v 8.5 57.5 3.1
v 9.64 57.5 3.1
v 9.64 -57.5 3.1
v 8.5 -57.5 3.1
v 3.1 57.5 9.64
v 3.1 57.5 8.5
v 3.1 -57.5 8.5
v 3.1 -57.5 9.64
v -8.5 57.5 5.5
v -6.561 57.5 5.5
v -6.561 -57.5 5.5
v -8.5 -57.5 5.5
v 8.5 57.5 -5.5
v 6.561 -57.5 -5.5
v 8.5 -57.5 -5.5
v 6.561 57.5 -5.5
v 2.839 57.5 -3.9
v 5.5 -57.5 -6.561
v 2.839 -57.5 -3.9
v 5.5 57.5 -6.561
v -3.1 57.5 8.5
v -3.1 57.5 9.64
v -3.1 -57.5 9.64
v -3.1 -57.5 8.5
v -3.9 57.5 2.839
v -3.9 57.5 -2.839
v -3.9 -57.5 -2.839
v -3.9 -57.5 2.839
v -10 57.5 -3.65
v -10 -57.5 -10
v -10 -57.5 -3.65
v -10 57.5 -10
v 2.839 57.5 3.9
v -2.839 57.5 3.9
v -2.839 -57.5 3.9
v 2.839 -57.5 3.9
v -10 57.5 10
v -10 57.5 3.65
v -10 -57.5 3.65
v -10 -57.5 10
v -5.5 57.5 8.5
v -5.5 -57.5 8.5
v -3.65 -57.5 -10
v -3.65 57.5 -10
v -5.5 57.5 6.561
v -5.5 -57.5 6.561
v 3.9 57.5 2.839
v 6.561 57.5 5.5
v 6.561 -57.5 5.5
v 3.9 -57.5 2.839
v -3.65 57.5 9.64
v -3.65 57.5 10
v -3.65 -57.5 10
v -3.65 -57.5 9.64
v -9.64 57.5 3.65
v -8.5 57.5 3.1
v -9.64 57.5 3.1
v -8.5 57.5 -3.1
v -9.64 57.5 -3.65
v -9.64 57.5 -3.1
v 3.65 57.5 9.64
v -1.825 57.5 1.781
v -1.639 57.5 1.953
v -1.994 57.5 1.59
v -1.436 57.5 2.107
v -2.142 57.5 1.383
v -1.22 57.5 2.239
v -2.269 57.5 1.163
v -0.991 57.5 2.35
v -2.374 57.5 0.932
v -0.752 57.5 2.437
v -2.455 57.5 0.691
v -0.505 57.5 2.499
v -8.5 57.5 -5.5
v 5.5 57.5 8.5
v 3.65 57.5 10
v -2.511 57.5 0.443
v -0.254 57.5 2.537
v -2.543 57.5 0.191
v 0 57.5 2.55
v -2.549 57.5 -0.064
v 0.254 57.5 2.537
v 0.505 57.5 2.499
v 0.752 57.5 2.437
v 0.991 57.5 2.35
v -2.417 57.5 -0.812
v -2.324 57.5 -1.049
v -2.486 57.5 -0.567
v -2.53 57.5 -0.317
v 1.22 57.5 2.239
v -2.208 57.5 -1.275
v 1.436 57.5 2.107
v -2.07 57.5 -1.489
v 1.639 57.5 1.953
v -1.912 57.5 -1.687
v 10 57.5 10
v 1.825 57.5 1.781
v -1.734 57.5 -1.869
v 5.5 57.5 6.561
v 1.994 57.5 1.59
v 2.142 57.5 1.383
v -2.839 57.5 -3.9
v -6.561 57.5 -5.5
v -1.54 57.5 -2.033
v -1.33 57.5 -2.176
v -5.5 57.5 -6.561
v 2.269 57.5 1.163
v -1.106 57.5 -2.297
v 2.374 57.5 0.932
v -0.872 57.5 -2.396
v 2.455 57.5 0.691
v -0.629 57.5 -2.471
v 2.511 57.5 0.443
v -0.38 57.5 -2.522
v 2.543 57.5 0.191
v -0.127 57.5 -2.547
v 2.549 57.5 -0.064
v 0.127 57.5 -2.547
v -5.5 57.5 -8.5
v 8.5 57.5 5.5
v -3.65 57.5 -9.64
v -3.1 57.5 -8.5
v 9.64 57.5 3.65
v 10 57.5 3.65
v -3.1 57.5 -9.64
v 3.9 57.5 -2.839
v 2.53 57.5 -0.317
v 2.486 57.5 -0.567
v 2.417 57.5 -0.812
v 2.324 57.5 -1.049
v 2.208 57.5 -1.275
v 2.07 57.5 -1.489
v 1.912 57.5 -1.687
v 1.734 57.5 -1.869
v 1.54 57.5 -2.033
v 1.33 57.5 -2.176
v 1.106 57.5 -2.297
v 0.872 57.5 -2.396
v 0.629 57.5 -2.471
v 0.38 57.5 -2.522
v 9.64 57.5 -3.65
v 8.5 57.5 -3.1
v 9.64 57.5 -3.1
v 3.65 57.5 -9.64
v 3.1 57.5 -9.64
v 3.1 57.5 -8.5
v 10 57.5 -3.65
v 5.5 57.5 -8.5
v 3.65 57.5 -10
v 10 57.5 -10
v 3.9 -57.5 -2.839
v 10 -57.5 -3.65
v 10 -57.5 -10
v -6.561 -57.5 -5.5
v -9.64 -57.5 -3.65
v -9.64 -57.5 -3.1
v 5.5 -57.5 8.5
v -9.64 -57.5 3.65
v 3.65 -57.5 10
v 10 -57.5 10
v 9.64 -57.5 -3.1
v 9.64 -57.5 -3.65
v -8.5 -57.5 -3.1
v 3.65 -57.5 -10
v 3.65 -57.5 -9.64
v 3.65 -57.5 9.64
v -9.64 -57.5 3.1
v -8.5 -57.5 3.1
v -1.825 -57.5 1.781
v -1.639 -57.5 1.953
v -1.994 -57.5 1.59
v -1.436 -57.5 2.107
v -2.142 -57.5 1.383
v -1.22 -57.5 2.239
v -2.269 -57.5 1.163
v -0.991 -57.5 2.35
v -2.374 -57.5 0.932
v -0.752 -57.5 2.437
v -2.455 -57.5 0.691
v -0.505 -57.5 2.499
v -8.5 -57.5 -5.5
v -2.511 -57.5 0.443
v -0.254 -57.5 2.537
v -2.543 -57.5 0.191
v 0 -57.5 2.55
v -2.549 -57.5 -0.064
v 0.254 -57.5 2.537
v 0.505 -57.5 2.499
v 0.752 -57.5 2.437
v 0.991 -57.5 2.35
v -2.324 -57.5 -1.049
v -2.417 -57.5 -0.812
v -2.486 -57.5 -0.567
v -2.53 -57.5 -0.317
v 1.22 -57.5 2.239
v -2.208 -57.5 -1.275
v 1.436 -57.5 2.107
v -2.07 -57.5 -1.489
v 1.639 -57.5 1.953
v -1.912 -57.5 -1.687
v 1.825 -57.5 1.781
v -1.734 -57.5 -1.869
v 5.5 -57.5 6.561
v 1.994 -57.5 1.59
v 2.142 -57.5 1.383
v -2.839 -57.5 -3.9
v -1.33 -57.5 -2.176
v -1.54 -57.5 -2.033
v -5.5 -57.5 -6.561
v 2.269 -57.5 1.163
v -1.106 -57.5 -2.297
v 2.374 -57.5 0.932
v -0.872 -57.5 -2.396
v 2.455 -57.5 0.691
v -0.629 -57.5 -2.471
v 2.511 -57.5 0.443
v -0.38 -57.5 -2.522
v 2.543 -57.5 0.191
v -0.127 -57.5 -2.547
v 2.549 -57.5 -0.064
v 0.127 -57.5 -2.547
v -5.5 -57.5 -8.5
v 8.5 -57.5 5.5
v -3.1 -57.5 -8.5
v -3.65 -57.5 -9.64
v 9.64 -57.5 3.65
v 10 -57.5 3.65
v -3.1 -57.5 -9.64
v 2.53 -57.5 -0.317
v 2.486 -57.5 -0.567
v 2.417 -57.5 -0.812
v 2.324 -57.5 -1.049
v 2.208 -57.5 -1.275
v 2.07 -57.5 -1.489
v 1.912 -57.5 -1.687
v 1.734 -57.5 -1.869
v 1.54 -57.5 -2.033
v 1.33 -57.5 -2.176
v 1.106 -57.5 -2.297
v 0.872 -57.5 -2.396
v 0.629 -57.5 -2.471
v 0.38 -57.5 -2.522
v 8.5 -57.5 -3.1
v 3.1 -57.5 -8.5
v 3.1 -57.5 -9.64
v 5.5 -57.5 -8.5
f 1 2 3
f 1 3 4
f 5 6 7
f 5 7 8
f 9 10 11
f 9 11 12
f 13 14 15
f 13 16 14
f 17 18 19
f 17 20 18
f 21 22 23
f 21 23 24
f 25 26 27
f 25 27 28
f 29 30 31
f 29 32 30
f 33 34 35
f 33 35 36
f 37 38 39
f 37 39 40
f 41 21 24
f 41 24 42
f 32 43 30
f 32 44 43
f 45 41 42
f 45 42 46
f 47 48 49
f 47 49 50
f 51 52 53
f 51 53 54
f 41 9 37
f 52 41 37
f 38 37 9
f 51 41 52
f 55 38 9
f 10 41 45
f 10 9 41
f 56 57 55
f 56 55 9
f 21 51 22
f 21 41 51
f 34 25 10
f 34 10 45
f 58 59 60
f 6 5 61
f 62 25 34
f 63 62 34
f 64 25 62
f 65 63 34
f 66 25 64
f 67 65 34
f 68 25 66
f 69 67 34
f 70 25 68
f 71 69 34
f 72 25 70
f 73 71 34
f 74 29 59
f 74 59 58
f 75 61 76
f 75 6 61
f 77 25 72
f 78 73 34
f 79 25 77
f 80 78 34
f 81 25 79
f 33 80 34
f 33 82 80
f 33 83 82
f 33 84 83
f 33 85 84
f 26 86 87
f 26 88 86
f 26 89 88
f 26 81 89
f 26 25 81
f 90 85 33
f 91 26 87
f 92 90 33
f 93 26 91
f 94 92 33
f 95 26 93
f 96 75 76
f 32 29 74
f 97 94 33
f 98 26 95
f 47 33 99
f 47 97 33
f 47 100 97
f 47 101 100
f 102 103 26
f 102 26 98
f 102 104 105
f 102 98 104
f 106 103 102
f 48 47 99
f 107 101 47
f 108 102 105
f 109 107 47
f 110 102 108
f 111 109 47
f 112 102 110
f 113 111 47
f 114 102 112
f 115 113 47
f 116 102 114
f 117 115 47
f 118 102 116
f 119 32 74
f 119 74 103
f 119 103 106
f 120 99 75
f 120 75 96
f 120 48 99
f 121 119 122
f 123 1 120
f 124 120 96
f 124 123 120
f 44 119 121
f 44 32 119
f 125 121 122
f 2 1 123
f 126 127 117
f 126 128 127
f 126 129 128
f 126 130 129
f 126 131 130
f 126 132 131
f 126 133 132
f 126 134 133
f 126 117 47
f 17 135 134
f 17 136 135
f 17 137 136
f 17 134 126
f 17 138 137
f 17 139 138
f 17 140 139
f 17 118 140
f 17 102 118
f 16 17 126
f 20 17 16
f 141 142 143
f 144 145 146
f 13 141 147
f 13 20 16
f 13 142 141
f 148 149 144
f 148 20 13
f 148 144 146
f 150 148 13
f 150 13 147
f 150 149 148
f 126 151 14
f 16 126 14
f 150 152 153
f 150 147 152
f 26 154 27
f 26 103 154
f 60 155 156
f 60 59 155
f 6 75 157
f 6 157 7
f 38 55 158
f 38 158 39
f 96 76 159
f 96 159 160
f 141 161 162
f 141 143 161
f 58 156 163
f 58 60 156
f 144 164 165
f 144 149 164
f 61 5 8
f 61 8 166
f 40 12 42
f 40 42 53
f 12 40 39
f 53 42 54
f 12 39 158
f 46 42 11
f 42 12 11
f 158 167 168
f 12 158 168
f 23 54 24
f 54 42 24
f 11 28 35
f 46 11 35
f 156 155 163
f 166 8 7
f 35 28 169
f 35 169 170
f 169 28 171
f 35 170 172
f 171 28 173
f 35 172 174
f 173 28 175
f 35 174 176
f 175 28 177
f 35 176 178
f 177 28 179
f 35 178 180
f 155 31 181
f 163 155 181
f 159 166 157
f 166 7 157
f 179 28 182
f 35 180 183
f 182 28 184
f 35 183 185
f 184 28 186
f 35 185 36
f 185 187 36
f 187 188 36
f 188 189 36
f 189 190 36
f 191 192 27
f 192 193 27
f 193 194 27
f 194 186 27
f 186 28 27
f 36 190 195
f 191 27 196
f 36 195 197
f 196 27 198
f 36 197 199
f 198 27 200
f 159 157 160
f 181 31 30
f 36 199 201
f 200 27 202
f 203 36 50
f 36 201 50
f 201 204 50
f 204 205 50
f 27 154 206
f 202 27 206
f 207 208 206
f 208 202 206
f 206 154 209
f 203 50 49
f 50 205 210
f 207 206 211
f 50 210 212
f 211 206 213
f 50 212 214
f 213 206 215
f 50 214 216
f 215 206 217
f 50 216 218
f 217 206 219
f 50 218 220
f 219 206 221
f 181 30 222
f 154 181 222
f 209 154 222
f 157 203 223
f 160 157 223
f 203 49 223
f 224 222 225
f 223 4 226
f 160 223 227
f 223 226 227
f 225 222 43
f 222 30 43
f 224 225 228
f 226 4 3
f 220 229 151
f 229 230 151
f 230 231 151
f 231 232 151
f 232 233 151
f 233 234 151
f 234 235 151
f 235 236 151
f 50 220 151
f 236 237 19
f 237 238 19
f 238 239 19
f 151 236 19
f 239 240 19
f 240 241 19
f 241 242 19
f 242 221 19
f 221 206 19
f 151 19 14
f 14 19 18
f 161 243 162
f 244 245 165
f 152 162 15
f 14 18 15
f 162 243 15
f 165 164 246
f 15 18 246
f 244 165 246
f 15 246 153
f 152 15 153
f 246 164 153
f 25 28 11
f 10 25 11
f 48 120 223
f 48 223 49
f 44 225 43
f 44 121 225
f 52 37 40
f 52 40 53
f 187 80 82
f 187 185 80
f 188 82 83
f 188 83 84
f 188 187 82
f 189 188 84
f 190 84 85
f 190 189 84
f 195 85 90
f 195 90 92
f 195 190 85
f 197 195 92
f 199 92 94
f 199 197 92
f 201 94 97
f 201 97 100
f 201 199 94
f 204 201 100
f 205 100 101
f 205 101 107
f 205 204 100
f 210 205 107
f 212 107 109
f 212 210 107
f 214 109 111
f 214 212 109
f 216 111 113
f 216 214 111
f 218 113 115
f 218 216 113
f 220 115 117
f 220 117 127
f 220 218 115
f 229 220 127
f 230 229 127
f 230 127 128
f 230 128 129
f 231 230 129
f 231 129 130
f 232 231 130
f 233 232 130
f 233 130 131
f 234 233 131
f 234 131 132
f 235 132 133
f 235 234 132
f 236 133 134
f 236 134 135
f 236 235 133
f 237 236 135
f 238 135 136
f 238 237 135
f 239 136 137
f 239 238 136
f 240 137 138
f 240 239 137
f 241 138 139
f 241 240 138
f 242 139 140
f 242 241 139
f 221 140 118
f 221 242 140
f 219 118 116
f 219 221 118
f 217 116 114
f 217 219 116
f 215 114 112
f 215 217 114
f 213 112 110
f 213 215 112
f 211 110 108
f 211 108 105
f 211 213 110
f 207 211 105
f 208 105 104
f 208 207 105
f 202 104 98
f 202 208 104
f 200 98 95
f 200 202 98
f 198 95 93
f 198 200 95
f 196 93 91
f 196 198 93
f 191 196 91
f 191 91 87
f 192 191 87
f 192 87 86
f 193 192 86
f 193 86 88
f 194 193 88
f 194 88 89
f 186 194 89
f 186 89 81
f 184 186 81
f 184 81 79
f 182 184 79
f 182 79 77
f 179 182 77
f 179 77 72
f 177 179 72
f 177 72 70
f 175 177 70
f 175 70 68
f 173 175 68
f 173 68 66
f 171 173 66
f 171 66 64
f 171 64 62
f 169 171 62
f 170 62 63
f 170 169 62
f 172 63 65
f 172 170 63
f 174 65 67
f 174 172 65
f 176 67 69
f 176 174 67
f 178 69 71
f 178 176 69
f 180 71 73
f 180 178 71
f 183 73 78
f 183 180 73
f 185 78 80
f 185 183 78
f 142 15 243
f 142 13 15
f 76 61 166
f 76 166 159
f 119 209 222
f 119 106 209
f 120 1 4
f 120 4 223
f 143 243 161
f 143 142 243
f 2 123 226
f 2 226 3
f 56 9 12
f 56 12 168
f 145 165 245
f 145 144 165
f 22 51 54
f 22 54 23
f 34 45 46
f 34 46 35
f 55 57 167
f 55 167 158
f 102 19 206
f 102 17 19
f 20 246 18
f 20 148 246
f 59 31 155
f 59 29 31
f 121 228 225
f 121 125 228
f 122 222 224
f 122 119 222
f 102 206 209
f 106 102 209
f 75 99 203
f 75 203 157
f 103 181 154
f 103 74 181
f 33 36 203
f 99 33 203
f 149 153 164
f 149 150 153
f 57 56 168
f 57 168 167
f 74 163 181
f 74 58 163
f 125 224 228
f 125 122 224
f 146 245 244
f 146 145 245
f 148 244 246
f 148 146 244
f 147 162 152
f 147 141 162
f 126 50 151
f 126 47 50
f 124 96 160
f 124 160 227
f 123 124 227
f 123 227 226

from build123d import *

# Parameters (mm, degrees)
SKETCH1_R           = 2.55
BOSS_EXTRUDE1_DEPTH = 57.5


with BuildPart() as part:
    # Sketch1 → Boss-Extrude1 (new, symmetric)
    with BuildSketch(Plane(origin=(0, 0, 0), x_dir=(1, 0, 0), z_dir=(0, 1, 0))):
        Polygon((-6.560660172, 5.5), (-3.9, 2.839339828), (-3.9, -2.839339828), (-6.560660172, -5.5), (-8.5, -5.5), (-8.5, -3.1), (-9.639683838, -3.1), (-9.639683838, -3.65), (-10, -3.65), (-10, -10), (-3.65, -10), (-3.65, -9.639683838), (-3.1, -9.639683838), (-3.1, -8.5), (-5.5, -8.5), (-5.5, -6.560660172), (-2.839339828, -3.9), (2.839339828, -3.9), (5.5, -6.560660172), (5.5, -8.5), (3.1, -8.5), (3.1, -9.639683838), (3.65, -9.639683838), (3.65, -10), (10, -10), (10, -3.65), (9.639683838, -3.65), (9.639683838, -3.1), (8.5, -3.1), (8.5, -5.5), (6.560660172, -5.5), (3.9, -2.839339828), (3.9, 2.839339828), (6.560660172, 5.5), (8.5, 5.5), (8.5, 3.1), (9.639683838, 3.1), (9.639683838, 3.65), (10, 3.65), (10, 10), (3.65, 10), (3.65, 9.639683838), (3.1, 9.639683838), (3.1, 8.5), (5.5, 8.5), (5.5, 6.560660172), (2.839339828, 3.9), (-2.839339828, 3.9), (-5.5, 6.560660172), (-5.5, 8.5), (-3.1, 8.5), (-3.1, 9.639683838), (-3.65, 9.639683838), (-3.65, 10), (-10, 10), (-10, 3.65), (-9.639683838, 3.65), (-9.639683838, 3.1), (-8.5, 3.1), (-8.5, 5.5), align=None)
        with Locations(Location((0, 0, 0), (0, 0, 270))):
            Circle(SKETCH1_R, mode=Mode.SUBTRACT)
    extrude(amount=BOSS_EXTRUDE1_DEPTH, both=True)


solid = part.part
